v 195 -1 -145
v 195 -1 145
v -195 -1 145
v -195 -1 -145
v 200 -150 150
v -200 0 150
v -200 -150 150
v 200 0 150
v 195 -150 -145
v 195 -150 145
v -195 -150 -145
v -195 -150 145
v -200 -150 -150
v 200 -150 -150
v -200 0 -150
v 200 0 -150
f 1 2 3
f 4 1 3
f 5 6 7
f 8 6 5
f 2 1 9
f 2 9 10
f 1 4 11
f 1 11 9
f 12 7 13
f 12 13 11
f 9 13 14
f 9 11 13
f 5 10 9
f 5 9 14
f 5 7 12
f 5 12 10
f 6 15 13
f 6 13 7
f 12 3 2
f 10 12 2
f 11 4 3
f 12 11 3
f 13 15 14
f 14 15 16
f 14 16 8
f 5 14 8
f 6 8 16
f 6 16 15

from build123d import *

# Parameters (mm, degrees)
F0_W     = 400
F0_H     = 300
F0_W_2   = 390.000014
F0_H_2   = 290.000014
F1_DEPTH = 150
F2_W     = 390.000014
F2_H     = 290.000014
F3_DEPTH = 1


with BuildPart() as f1:
    # F0 (on Front) → F1 (new body)
    with BuildSketch(Plane.XZ):
        Rectangle(F0_W, F0_H)
        Rectangle(F0_W_2, F0_H_2, mode=Mode.SUBTRACT)
    extrude(amount=F1_DEPTH)

    # F2 (on face) → F3 (join)
    with BuildSketch(Plane(origin=(0, 0, 0), x_dir=(-1, 0, 0), z_dir=(0, 1, 0))):
        Rectangle(F2_W, F2_H)
    extrude(amount=-F3_DEPTH)


solid = f1.part
